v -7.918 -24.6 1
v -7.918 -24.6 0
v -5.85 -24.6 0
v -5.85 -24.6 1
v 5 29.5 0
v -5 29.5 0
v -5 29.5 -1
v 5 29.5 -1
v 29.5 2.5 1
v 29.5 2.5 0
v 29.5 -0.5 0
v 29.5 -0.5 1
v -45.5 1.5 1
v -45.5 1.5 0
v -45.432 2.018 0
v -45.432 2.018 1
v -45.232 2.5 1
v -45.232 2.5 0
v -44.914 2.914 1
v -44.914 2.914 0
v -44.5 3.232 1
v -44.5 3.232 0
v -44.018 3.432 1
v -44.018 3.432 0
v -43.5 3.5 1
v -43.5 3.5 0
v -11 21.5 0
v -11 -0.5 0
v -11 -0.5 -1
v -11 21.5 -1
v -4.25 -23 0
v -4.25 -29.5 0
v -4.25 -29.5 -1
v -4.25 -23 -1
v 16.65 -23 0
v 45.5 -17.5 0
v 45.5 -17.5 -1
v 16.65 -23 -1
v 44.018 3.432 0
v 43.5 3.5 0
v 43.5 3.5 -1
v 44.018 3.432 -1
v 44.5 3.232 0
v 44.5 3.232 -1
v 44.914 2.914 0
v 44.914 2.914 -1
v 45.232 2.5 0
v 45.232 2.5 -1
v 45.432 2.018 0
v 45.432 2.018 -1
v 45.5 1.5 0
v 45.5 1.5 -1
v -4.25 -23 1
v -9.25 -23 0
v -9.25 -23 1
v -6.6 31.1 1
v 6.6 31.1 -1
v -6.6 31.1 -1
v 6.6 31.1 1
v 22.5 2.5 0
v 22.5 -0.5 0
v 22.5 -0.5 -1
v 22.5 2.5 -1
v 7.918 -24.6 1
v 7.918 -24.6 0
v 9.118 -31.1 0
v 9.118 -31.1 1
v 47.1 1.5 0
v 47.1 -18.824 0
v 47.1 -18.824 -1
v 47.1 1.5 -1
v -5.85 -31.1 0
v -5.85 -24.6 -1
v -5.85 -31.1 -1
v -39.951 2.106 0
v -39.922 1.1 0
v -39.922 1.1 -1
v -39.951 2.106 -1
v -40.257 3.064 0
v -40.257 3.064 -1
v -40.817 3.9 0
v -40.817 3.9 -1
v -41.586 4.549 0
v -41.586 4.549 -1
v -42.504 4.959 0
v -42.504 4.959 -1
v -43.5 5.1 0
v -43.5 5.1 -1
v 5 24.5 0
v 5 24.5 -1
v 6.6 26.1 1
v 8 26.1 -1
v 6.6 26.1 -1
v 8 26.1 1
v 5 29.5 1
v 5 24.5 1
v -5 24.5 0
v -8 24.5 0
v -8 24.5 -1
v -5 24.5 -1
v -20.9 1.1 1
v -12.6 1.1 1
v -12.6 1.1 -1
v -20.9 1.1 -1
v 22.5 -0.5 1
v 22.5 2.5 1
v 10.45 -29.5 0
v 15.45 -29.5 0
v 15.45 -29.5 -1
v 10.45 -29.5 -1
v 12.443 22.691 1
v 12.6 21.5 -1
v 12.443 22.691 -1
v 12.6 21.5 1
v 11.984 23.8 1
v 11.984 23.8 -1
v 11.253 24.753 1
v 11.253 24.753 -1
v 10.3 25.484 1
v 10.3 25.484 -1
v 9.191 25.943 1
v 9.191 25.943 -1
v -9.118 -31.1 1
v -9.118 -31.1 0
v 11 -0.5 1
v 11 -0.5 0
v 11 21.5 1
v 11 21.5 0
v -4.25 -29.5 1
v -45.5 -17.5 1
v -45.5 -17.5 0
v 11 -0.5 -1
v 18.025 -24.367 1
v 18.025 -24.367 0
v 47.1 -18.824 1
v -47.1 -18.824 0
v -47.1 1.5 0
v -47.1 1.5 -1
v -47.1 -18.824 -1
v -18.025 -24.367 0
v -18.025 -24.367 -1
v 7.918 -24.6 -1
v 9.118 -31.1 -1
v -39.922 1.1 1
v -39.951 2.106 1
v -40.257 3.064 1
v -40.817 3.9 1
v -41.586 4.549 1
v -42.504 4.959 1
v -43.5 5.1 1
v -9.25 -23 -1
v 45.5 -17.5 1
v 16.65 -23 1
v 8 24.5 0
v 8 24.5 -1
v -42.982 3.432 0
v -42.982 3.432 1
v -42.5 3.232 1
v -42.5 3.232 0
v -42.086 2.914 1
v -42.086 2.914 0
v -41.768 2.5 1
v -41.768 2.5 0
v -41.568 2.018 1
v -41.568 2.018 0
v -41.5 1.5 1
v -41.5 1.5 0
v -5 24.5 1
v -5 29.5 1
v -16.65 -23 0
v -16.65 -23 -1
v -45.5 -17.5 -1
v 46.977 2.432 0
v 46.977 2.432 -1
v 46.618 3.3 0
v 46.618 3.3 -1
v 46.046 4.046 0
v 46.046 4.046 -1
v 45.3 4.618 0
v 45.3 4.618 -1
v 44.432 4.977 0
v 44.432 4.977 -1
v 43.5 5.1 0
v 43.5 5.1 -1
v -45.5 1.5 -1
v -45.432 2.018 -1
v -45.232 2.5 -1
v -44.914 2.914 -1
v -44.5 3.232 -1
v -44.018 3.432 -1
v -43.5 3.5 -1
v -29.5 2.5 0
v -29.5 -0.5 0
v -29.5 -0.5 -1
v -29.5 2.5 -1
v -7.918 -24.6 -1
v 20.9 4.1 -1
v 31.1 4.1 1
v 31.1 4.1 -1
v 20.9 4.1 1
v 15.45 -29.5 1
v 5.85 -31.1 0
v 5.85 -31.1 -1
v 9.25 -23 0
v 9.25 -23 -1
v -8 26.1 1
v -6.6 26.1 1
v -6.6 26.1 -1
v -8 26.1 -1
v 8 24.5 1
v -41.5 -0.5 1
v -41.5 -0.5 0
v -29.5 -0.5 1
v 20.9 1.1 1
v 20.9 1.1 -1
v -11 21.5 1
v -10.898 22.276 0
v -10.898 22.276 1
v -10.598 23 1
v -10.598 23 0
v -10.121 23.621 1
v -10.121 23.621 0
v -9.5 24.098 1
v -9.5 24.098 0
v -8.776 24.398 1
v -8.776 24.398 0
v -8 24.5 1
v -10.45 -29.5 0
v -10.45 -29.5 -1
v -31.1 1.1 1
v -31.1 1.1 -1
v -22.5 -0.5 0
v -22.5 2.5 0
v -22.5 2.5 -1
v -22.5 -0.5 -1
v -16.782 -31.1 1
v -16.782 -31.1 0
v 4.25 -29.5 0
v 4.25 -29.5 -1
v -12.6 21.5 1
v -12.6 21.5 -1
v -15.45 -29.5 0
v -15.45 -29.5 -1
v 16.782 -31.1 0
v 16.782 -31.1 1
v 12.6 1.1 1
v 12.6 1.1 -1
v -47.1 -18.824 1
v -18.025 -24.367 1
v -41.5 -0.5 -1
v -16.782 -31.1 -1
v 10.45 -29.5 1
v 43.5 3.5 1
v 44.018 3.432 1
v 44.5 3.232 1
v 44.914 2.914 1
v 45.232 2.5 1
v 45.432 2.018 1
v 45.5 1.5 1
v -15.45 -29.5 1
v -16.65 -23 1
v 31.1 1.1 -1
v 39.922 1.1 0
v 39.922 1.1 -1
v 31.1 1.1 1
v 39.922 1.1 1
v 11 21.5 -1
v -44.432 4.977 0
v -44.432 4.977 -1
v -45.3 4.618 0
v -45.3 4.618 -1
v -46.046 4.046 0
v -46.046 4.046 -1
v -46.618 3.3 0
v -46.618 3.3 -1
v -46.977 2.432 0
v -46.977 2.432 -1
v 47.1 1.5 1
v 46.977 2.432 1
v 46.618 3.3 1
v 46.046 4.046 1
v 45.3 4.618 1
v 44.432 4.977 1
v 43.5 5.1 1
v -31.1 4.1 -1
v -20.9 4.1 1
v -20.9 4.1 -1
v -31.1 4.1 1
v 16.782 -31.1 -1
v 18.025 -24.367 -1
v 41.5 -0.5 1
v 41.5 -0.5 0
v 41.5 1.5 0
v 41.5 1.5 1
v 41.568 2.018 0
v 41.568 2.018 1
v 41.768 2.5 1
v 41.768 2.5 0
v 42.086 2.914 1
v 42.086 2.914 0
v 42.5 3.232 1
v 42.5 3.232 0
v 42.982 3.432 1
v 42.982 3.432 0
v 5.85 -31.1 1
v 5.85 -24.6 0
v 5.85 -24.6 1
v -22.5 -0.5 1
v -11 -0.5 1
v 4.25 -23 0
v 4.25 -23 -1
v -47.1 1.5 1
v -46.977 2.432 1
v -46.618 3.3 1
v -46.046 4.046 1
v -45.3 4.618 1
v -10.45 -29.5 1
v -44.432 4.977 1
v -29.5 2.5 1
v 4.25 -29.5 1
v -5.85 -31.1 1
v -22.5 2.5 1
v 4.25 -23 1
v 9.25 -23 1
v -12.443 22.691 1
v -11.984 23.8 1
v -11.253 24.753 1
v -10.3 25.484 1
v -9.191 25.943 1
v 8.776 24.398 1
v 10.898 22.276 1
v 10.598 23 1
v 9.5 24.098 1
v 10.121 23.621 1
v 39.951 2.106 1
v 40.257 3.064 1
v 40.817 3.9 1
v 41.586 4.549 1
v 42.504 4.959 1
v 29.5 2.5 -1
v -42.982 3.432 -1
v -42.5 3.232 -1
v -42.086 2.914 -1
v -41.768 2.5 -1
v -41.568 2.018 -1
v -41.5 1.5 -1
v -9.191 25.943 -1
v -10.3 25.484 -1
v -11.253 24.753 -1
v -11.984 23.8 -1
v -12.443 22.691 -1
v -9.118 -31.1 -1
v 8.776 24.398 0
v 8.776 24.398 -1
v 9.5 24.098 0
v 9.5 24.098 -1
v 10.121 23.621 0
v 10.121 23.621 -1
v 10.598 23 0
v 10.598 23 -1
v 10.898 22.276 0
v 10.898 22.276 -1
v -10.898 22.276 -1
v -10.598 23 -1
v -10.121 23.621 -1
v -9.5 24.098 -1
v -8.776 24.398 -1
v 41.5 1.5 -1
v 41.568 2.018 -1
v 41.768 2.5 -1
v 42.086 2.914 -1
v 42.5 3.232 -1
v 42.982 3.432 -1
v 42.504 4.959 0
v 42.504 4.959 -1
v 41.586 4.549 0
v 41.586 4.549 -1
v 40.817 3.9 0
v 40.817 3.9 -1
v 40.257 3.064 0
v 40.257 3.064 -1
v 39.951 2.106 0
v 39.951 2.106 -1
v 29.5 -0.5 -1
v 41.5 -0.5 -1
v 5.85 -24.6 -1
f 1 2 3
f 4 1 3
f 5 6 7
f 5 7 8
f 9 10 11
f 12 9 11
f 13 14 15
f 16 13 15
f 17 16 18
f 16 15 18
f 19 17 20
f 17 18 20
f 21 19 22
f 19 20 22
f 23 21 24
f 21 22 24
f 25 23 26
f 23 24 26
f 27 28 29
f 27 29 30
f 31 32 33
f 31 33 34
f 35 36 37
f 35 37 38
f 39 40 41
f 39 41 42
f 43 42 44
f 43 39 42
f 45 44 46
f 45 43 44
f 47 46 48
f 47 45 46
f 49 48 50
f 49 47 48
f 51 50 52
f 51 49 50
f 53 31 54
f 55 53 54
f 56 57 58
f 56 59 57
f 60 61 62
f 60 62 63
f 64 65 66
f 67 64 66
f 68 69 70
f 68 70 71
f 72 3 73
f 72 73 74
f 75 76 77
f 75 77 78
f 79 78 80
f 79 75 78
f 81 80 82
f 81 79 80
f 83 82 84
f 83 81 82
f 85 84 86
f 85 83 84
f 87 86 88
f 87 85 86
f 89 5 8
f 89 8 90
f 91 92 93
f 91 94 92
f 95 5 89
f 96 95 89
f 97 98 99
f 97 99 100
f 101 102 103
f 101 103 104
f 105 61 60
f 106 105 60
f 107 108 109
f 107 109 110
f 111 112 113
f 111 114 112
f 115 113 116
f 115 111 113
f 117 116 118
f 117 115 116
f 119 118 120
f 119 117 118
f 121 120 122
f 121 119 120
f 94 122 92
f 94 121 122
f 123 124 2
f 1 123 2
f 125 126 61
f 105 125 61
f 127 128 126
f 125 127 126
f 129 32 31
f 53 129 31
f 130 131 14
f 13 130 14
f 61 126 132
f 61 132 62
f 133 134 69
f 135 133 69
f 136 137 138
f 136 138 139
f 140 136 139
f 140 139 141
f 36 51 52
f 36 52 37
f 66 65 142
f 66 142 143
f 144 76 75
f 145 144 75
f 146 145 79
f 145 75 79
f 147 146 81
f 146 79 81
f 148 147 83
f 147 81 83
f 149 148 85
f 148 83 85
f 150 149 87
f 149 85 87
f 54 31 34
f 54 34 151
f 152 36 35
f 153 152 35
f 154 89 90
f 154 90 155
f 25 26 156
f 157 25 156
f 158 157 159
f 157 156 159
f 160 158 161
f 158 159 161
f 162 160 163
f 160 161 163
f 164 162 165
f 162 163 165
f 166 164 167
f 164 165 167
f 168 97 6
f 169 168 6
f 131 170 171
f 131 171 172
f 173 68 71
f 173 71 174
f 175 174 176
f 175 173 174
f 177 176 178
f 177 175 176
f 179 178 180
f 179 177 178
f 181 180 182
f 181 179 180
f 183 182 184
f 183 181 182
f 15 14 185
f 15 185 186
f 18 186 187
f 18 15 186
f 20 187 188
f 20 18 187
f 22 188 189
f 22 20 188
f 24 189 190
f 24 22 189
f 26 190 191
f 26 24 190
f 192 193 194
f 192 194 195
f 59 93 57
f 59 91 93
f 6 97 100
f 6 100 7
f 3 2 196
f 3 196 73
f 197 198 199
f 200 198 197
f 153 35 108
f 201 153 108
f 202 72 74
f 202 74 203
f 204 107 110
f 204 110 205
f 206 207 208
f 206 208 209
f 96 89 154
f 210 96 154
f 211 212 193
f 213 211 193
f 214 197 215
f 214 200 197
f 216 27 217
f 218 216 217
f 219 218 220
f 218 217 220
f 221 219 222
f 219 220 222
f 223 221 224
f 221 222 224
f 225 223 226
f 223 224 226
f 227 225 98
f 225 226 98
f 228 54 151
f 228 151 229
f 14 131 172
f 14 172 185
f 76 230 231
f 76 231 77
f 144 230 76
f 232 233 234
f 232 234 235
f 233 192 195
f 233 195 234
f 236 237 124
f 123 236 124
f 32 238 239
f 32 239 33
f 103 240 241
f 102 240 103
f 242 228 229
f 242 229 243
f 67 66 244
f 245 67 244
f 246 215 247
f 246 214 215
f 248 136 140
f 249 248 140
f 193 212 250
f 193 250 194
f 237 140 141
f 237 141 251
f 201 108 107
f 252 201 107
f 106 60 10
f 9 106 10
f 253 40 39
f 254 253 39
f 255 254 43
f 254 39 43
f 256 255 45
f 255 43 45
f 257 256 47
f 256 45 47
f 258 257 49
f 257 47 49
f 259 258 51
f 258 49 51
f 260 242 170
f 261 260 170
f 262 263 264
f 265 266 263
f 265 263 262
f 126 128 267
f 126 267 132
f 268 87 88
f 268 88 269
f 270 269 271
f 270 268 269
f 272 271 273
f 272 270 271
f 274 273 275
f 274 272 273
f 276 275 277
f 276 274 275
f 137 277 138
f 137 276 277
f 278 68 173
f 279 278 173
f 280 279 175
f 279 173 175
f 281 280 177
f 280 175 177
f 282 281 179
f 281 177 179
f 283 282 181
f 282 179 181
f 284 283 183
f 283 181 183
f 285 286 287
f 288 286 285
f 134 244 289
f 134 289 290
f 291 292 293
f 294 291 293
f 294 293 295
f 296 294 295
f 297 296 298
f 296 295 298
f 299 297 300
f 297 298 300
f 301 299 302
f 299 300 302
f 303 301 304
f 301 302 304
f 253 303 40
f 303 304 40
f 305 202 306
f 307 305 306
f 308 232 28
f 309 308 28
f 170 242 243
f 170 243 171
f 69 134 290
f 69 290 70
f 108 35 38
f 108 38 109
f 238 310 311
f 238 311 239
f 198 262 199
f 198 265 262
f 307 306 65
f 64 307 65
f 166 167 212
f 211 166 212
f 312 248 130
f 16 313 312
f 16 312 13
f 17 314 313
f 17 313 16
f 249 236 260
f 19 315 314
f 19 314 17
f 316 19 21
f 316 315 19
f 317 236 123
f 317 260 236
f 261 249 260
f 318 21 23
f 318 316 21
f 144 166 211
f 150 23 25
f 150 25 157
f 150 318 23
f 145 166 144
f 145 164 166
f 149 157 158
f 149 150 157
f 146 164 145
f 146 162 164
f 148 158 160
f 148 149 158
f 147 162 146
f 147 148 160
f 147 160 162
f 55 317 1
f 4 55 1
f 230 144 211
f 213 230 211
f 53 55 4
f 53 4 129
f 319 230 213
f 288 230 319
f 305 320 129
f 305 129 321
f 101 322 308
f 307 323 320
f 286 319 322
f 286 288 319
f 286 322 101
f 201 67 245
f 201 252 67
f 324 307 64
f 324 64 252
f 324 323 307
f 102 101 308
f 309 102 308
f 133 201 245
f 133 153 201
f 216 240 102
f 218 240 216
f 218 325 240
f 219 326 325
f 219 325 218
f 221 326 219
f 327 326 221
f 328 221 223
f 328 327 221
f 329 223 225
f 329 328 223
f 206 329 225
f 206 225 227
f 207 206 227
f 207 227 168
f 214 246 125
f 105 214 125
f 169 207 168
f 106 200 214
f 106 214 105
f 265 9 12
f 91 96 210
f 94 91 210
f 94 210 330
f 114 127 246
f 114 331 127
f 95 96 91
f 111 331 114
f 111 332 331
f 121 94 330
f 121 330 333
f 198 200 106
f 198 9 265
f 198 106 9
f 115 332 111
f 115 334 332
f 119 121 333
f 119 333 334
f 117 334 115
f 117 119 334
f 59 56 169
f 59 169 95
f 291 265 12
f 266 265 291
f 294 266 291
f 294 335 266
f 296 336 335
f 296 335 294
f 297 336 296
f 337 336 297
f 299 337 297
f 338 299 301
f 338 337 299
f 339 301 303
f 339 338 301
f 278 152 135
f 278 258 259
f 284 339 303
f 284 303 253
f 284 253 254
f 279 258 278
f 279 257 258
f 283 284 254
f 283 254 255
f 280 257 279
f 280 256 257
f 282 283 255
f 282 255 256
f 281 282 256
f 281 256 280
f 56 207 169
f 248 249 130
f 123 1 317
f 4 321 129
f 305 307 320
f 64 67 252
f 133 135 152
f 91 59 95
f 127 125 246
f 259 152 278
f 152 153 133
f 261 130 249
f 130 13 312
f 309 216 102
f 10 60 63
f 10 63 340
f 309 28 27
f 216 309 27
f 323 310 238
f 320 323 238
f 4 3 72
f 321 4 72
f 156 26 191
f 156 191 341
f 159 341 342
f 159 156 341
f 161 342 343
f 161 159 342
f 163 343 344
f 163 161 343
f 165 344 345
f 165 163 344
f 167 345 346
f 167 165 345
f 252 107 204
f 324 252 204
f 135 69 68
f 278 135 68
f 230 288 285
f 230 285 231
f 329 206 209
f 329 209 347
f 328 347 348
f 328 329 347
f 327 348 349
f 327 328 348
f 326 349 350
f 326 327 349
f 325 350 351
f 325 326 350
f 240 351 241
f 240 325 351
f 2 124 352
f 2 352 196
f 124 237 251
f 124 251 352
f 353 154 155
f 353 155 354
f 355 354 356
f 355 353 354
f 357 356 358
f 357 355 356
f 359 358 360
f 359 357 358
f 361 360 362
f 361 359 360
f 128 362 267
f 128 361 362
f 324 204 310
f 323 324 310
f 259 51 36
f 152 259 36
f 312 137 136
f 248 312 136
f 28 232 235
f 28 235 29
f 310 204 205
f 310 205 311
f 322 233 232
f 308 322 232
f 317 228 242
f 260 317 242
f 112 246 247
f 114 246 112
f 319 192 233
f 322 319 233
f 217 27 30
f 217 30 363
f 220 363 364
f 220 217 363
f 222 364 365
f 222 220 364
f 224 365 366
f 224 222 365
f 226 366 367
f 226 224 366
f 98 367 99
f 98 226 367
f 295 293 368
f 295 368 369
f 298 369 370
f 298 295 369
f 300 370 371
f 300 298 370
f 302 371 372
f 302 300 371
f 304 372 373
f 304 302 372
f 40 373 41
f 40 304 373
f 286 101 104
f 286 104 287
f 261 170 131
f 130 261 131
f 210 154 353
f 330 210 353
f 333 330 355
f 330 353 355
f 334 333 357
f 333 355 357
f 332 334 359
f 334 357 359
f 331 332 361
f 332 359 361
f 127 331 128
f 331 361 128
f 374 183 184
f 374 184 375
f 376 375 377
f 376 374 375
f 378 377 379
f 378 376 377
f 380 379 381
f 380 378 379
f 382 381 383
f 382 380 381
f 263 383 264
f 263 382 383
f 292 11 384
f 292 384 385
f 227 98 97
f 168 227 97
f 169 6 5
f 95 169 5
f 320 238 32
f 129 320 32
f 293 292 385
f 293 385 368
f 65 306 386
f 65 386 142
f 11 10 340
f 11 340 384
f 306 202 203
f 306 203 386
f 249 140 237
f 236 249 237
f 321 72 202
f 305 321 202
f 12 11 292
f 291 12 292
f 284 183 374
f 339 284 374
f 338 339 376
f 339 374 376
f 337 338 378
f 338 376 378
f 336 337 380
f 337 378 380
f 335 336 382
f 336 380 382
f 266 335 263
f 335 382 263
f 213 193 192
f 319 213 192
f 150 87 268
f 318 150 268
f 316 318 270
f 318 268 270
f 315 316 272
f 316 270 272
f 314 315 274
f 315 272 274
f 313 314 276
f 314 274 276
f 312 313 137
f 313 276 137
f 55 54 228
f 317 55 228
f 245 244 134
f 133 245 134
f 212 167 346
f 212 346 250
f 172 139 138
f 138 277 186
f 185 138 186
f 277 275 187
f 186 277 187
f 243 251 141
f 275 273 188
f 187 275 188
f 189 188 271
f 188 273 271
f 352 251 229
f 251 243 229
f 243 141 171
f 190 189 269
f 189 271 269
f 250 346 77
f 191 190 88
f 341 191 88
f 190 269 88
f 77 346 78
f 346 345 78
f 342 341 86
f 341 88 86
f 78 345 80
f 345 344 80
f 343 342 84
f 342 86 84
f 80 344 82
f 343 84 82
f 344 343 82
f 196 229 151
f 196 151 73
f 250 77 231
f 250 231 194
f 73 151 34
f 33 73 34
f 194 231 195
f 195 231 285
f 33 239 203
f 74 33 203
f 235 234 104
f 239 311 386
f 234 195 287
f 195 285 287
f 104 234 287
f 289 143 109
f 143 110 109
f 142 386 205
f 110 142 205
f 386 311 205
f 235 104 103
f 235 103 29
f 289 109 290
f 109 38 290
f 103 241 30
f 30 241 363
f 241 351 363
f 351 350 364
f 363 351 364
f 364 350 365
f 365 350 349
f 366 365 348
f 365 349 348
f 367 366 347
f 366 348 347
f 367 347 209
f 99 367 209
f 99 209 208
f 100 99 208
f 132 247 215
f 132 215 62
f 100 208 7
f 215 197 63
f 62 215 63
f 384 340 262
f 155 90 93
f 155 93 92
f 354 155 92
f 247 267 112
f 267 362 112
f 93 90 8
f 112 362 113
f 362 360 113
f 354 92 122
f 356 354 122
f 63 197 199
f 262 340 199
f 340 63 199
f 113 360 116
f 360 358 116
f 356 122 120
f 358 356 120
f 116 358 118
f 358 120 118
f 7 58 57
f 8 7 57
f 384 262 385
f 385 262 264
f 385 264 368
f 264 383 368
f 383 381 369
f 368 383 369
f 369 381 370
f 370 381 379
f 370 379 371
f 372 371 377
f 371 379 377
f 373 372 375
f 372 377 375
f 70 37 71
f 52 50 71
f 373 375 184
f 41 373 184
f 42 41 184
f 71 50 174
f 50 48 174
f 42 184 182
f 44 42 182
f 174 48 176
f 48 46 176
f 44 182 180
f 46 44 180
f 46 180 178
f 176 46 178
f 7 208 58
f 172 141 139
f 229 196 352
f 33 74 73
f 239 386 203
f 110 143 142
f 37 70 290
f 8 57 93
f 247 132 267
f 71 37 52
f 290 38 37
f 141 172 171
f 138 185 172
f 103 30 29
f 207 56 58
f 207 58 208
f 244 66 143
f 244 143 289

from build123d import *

# Parameters (mm, degrees)
F1_DEPTH = 1


# Not quite as in the source:
# - a feature names something its author has since deleted; it is built from what else it names


with BuildPart() as f1:
    # F0 (on Top) → F1 (new body, symmetric)
    with BuildSketch(Plane.XY):
        with BuildLine():
            Line((6.5999999642, 31.0999999642), (0, 31.0999999642))
            Line((0, 31.0999999642), (-6.5999999642, 31.0999999642))
            Line((-6.5999999642, 31.0999999642), (-6.5999999642, 26.0999999642))
            Line((-6.5999999642, 26.0999999642), (-8, 26.0999999642))
            ThreePointArc((-8, 26.0999999642), (-11.2526911682, 24.7526911682), (-12.5999999642, 21.5))
            Line((-12.5999999642, 21.5), (-12.5999999642, 1.0999999642))
            Line((-12.5999999642, 1.0999999642), (-20.9000000358, 1.0999999642))
            Line((-20.9000000358, 1.0999999642), (-20.9000000358, 4.0999999642))
            Line((-20.9000000358, 4.0999999642), (-31.0999999642, 4.0999999642))
            Line((-31.0999999642, 4.0999999642), (-31.0999999642, 1.0999999642))
            Line((-31.0999999642, 1.0999999642), (-39.922291276, 1.0999999642))
            ThreePointArc((-39.922291276, 1.0999999642), (-40.8167184403, 3.8999999613), (-43.5, 5.0999999642))
            ThreePointArc((-43.5, 5.0999999642), (-46.045584387, 4.045584387), (-47.0999999642, 1.5))
            Line((-47.0999999642, 1.5), (-47.0999999642, -18.823789758))
            Line((-47.0999999642, -18.823789758), (-18.0247169235, -24.366737998))
            Line((-18.0247169235, -24.366737998), (-16.7816531759, -31.0999999642))
            Line((-16.7816531759, -31.0999999642), (-9.1183468241, -31.0999999642))
            Line((-9.1183468241, -31.0999999642), (-7.9183468241, -24.5999999642))
            Line((-7.9183468241, -24.5999999642), (-5.8499999642, -24.5999999642))
            Line((-5.8499999642, -24.5999999642), (-5.8499999642, -31.0999999642))
            Line((-5.8499999642, -31.0999999642), (0, -31.0999999642))
            Line((0, -31.0999999642), (5.8499999642, -31.0999999642))
            Line((5.8499999642, -31.0999999642), (5.8499999642, -24.5999999642))
            Line((5.8499999642, -24.5999999642), (7.9183468241, -24.5999999642))
            Line((7.9183468241, -24.5999999642), (9.1183468241, -31.0999999642))
            Line((9.1183468241, -31.0999999642), (16.7816531759, -31.0999999642))
            Line((16.7816531759, -31.0999999642), (18.0247169235, -24.366737998))
            Line((18.0247169235, -24.366737998), (47.0999999642, -18.823789758))
            Line((47.0999999642, -18.823789758), (47.0999999642, 1.5))
            ThreePointArc((47.0999999642, 1.5), (46.045584387, 4.045584387), (43.5, 5.0999999642))
            ThreePointArc((43.5, 5.0999999642), (40.8167184403, 3.8999999613), (39.922291276, 1.0999999642))
            Line((39.922291276, 1.0999999642), (31.0999999642, 1.0999999642))
            Line((31.0999999642, 1.0999999642), (31.0999999642, 4.0999999642))
            Line((31.0999999642, 4.0999999642), (20.9000000358, 4.0999999642))
            Line((20.9000000358, 4.0999999642), (20.9000000358, 1.0999999642))
            Line((20.9000000358, 1.0999999642), (12.5999999642, 1.0999999642))
            Line((12.5999999642, 1.0999999642), (12.5999999642, 21.5))
            ThreePointArc((12.5999999642, 21.5), (11.2526911682, 24.7526911682), (8, 26.0999999642))
            Line((8, 26.0999999642), (6.5999999642, 26.0999999642))
            Line((6.5999999642, 26.0999999642), (6.5999999642, 31.0999999642))
        make_face()
        with BuildLine():
            Line((-5, 29.5), (0, 29.5))
            Line((0, 29.5), (5, 29.5))
            Line((5, 29.5), (5, 24.5))
            Line((5, 24.5), (8, 24.5))
            ThreePointArc((8, 24.5), (10.1213203436, 23.6213203436), (11, 21.5))
            Line((11, 21.5), (11, -0.5))
            Line((11, -0.5), (22.5, -0.5))
            Line((22.5, -0.5), (22.5, 2.5))
            Line((22.5, 2.5), (29.5, 2.5))
            Line((29.5, 2.5), (29.5, -0.5))
            Line((29.5, -0.5), (41.5, -0.5))
            Line((41.5, -0.5), (41.5, 1.5))
            ThreePointArc((41.5, 1.5), (42.0857864376, 2.9142135624), (43.5, 3.5))
            ThreePointArc((43.5, 3.5), (44.9142135624, 2.9142135624), (45.5, 1.5))
            Line((45.5, 1.5), (45.5, -17.5))
            Line((45.5, -17.5), (16.65, -23))
            Line((16.65, -23), (15.45, -29.5))
            Line((15.45, -29.5), (10.45, -29.5))
            Line((10.45, -29.5), (9.25, -23))
            Line((9.25, -23), (4.25, -23))
            Line((4.25, -23), (4.25, -29.5))
            Line((4.25, -29.5), (0, -29.5))
            Line((0, -29.5), (-4.25, -29.5))
            Line((-4.25, -29.5), (-4.25, -23))
            Line((-4.25, -23), (-9.25, -23))
            Line((-9.25, -23), (-10.45, -29.5))
            Line((-10.45, -29.5), (-15.45, -29.5))
            Line((-15.45, -29.5), (-16.65, -23))
            Line((-16.65, -23), (-45.5, -17.5))
            Line((-45.5, -17.5), (-45.5, 1.5))
            ThreePointArc((-45.5, 1.5), (-44.9142135624, 2.9142135624), (-43.5, 3.5))
            ThreePointArc((-43.5, 3.5), (-42.0857864376, 2.9142135624), (-41.5, 1.5))
            Line((-41.5, 1.5), (-41.5, -0.5))
            Line((-41.5, -0.5), (-29.5, -0.5))
            Line((-29.5, -0.5), (-29.5, 2.5))
            Line((-29.5, 2.5), (-22.5, 2.5))
            Line((-22.5, 2.5), (-22.5, -0.5))
            Line((-22.5, -0.5), (-11, -0.5))
            Line((-11, -0.5), (-11, 21.5))
            ThreePointArc((-11, 21.5), (-10.1213203436, 23.6213203436), (-8, 24.5))
            Line((-8, 24.5), (-5, 24.5))
            Line((-5, 24.5), (-5, 29.5))
        make_face(mode=Mode.SUBTRACT)
    extrude(amount=F1_DEPTH, both=True)


solid = f1.part
